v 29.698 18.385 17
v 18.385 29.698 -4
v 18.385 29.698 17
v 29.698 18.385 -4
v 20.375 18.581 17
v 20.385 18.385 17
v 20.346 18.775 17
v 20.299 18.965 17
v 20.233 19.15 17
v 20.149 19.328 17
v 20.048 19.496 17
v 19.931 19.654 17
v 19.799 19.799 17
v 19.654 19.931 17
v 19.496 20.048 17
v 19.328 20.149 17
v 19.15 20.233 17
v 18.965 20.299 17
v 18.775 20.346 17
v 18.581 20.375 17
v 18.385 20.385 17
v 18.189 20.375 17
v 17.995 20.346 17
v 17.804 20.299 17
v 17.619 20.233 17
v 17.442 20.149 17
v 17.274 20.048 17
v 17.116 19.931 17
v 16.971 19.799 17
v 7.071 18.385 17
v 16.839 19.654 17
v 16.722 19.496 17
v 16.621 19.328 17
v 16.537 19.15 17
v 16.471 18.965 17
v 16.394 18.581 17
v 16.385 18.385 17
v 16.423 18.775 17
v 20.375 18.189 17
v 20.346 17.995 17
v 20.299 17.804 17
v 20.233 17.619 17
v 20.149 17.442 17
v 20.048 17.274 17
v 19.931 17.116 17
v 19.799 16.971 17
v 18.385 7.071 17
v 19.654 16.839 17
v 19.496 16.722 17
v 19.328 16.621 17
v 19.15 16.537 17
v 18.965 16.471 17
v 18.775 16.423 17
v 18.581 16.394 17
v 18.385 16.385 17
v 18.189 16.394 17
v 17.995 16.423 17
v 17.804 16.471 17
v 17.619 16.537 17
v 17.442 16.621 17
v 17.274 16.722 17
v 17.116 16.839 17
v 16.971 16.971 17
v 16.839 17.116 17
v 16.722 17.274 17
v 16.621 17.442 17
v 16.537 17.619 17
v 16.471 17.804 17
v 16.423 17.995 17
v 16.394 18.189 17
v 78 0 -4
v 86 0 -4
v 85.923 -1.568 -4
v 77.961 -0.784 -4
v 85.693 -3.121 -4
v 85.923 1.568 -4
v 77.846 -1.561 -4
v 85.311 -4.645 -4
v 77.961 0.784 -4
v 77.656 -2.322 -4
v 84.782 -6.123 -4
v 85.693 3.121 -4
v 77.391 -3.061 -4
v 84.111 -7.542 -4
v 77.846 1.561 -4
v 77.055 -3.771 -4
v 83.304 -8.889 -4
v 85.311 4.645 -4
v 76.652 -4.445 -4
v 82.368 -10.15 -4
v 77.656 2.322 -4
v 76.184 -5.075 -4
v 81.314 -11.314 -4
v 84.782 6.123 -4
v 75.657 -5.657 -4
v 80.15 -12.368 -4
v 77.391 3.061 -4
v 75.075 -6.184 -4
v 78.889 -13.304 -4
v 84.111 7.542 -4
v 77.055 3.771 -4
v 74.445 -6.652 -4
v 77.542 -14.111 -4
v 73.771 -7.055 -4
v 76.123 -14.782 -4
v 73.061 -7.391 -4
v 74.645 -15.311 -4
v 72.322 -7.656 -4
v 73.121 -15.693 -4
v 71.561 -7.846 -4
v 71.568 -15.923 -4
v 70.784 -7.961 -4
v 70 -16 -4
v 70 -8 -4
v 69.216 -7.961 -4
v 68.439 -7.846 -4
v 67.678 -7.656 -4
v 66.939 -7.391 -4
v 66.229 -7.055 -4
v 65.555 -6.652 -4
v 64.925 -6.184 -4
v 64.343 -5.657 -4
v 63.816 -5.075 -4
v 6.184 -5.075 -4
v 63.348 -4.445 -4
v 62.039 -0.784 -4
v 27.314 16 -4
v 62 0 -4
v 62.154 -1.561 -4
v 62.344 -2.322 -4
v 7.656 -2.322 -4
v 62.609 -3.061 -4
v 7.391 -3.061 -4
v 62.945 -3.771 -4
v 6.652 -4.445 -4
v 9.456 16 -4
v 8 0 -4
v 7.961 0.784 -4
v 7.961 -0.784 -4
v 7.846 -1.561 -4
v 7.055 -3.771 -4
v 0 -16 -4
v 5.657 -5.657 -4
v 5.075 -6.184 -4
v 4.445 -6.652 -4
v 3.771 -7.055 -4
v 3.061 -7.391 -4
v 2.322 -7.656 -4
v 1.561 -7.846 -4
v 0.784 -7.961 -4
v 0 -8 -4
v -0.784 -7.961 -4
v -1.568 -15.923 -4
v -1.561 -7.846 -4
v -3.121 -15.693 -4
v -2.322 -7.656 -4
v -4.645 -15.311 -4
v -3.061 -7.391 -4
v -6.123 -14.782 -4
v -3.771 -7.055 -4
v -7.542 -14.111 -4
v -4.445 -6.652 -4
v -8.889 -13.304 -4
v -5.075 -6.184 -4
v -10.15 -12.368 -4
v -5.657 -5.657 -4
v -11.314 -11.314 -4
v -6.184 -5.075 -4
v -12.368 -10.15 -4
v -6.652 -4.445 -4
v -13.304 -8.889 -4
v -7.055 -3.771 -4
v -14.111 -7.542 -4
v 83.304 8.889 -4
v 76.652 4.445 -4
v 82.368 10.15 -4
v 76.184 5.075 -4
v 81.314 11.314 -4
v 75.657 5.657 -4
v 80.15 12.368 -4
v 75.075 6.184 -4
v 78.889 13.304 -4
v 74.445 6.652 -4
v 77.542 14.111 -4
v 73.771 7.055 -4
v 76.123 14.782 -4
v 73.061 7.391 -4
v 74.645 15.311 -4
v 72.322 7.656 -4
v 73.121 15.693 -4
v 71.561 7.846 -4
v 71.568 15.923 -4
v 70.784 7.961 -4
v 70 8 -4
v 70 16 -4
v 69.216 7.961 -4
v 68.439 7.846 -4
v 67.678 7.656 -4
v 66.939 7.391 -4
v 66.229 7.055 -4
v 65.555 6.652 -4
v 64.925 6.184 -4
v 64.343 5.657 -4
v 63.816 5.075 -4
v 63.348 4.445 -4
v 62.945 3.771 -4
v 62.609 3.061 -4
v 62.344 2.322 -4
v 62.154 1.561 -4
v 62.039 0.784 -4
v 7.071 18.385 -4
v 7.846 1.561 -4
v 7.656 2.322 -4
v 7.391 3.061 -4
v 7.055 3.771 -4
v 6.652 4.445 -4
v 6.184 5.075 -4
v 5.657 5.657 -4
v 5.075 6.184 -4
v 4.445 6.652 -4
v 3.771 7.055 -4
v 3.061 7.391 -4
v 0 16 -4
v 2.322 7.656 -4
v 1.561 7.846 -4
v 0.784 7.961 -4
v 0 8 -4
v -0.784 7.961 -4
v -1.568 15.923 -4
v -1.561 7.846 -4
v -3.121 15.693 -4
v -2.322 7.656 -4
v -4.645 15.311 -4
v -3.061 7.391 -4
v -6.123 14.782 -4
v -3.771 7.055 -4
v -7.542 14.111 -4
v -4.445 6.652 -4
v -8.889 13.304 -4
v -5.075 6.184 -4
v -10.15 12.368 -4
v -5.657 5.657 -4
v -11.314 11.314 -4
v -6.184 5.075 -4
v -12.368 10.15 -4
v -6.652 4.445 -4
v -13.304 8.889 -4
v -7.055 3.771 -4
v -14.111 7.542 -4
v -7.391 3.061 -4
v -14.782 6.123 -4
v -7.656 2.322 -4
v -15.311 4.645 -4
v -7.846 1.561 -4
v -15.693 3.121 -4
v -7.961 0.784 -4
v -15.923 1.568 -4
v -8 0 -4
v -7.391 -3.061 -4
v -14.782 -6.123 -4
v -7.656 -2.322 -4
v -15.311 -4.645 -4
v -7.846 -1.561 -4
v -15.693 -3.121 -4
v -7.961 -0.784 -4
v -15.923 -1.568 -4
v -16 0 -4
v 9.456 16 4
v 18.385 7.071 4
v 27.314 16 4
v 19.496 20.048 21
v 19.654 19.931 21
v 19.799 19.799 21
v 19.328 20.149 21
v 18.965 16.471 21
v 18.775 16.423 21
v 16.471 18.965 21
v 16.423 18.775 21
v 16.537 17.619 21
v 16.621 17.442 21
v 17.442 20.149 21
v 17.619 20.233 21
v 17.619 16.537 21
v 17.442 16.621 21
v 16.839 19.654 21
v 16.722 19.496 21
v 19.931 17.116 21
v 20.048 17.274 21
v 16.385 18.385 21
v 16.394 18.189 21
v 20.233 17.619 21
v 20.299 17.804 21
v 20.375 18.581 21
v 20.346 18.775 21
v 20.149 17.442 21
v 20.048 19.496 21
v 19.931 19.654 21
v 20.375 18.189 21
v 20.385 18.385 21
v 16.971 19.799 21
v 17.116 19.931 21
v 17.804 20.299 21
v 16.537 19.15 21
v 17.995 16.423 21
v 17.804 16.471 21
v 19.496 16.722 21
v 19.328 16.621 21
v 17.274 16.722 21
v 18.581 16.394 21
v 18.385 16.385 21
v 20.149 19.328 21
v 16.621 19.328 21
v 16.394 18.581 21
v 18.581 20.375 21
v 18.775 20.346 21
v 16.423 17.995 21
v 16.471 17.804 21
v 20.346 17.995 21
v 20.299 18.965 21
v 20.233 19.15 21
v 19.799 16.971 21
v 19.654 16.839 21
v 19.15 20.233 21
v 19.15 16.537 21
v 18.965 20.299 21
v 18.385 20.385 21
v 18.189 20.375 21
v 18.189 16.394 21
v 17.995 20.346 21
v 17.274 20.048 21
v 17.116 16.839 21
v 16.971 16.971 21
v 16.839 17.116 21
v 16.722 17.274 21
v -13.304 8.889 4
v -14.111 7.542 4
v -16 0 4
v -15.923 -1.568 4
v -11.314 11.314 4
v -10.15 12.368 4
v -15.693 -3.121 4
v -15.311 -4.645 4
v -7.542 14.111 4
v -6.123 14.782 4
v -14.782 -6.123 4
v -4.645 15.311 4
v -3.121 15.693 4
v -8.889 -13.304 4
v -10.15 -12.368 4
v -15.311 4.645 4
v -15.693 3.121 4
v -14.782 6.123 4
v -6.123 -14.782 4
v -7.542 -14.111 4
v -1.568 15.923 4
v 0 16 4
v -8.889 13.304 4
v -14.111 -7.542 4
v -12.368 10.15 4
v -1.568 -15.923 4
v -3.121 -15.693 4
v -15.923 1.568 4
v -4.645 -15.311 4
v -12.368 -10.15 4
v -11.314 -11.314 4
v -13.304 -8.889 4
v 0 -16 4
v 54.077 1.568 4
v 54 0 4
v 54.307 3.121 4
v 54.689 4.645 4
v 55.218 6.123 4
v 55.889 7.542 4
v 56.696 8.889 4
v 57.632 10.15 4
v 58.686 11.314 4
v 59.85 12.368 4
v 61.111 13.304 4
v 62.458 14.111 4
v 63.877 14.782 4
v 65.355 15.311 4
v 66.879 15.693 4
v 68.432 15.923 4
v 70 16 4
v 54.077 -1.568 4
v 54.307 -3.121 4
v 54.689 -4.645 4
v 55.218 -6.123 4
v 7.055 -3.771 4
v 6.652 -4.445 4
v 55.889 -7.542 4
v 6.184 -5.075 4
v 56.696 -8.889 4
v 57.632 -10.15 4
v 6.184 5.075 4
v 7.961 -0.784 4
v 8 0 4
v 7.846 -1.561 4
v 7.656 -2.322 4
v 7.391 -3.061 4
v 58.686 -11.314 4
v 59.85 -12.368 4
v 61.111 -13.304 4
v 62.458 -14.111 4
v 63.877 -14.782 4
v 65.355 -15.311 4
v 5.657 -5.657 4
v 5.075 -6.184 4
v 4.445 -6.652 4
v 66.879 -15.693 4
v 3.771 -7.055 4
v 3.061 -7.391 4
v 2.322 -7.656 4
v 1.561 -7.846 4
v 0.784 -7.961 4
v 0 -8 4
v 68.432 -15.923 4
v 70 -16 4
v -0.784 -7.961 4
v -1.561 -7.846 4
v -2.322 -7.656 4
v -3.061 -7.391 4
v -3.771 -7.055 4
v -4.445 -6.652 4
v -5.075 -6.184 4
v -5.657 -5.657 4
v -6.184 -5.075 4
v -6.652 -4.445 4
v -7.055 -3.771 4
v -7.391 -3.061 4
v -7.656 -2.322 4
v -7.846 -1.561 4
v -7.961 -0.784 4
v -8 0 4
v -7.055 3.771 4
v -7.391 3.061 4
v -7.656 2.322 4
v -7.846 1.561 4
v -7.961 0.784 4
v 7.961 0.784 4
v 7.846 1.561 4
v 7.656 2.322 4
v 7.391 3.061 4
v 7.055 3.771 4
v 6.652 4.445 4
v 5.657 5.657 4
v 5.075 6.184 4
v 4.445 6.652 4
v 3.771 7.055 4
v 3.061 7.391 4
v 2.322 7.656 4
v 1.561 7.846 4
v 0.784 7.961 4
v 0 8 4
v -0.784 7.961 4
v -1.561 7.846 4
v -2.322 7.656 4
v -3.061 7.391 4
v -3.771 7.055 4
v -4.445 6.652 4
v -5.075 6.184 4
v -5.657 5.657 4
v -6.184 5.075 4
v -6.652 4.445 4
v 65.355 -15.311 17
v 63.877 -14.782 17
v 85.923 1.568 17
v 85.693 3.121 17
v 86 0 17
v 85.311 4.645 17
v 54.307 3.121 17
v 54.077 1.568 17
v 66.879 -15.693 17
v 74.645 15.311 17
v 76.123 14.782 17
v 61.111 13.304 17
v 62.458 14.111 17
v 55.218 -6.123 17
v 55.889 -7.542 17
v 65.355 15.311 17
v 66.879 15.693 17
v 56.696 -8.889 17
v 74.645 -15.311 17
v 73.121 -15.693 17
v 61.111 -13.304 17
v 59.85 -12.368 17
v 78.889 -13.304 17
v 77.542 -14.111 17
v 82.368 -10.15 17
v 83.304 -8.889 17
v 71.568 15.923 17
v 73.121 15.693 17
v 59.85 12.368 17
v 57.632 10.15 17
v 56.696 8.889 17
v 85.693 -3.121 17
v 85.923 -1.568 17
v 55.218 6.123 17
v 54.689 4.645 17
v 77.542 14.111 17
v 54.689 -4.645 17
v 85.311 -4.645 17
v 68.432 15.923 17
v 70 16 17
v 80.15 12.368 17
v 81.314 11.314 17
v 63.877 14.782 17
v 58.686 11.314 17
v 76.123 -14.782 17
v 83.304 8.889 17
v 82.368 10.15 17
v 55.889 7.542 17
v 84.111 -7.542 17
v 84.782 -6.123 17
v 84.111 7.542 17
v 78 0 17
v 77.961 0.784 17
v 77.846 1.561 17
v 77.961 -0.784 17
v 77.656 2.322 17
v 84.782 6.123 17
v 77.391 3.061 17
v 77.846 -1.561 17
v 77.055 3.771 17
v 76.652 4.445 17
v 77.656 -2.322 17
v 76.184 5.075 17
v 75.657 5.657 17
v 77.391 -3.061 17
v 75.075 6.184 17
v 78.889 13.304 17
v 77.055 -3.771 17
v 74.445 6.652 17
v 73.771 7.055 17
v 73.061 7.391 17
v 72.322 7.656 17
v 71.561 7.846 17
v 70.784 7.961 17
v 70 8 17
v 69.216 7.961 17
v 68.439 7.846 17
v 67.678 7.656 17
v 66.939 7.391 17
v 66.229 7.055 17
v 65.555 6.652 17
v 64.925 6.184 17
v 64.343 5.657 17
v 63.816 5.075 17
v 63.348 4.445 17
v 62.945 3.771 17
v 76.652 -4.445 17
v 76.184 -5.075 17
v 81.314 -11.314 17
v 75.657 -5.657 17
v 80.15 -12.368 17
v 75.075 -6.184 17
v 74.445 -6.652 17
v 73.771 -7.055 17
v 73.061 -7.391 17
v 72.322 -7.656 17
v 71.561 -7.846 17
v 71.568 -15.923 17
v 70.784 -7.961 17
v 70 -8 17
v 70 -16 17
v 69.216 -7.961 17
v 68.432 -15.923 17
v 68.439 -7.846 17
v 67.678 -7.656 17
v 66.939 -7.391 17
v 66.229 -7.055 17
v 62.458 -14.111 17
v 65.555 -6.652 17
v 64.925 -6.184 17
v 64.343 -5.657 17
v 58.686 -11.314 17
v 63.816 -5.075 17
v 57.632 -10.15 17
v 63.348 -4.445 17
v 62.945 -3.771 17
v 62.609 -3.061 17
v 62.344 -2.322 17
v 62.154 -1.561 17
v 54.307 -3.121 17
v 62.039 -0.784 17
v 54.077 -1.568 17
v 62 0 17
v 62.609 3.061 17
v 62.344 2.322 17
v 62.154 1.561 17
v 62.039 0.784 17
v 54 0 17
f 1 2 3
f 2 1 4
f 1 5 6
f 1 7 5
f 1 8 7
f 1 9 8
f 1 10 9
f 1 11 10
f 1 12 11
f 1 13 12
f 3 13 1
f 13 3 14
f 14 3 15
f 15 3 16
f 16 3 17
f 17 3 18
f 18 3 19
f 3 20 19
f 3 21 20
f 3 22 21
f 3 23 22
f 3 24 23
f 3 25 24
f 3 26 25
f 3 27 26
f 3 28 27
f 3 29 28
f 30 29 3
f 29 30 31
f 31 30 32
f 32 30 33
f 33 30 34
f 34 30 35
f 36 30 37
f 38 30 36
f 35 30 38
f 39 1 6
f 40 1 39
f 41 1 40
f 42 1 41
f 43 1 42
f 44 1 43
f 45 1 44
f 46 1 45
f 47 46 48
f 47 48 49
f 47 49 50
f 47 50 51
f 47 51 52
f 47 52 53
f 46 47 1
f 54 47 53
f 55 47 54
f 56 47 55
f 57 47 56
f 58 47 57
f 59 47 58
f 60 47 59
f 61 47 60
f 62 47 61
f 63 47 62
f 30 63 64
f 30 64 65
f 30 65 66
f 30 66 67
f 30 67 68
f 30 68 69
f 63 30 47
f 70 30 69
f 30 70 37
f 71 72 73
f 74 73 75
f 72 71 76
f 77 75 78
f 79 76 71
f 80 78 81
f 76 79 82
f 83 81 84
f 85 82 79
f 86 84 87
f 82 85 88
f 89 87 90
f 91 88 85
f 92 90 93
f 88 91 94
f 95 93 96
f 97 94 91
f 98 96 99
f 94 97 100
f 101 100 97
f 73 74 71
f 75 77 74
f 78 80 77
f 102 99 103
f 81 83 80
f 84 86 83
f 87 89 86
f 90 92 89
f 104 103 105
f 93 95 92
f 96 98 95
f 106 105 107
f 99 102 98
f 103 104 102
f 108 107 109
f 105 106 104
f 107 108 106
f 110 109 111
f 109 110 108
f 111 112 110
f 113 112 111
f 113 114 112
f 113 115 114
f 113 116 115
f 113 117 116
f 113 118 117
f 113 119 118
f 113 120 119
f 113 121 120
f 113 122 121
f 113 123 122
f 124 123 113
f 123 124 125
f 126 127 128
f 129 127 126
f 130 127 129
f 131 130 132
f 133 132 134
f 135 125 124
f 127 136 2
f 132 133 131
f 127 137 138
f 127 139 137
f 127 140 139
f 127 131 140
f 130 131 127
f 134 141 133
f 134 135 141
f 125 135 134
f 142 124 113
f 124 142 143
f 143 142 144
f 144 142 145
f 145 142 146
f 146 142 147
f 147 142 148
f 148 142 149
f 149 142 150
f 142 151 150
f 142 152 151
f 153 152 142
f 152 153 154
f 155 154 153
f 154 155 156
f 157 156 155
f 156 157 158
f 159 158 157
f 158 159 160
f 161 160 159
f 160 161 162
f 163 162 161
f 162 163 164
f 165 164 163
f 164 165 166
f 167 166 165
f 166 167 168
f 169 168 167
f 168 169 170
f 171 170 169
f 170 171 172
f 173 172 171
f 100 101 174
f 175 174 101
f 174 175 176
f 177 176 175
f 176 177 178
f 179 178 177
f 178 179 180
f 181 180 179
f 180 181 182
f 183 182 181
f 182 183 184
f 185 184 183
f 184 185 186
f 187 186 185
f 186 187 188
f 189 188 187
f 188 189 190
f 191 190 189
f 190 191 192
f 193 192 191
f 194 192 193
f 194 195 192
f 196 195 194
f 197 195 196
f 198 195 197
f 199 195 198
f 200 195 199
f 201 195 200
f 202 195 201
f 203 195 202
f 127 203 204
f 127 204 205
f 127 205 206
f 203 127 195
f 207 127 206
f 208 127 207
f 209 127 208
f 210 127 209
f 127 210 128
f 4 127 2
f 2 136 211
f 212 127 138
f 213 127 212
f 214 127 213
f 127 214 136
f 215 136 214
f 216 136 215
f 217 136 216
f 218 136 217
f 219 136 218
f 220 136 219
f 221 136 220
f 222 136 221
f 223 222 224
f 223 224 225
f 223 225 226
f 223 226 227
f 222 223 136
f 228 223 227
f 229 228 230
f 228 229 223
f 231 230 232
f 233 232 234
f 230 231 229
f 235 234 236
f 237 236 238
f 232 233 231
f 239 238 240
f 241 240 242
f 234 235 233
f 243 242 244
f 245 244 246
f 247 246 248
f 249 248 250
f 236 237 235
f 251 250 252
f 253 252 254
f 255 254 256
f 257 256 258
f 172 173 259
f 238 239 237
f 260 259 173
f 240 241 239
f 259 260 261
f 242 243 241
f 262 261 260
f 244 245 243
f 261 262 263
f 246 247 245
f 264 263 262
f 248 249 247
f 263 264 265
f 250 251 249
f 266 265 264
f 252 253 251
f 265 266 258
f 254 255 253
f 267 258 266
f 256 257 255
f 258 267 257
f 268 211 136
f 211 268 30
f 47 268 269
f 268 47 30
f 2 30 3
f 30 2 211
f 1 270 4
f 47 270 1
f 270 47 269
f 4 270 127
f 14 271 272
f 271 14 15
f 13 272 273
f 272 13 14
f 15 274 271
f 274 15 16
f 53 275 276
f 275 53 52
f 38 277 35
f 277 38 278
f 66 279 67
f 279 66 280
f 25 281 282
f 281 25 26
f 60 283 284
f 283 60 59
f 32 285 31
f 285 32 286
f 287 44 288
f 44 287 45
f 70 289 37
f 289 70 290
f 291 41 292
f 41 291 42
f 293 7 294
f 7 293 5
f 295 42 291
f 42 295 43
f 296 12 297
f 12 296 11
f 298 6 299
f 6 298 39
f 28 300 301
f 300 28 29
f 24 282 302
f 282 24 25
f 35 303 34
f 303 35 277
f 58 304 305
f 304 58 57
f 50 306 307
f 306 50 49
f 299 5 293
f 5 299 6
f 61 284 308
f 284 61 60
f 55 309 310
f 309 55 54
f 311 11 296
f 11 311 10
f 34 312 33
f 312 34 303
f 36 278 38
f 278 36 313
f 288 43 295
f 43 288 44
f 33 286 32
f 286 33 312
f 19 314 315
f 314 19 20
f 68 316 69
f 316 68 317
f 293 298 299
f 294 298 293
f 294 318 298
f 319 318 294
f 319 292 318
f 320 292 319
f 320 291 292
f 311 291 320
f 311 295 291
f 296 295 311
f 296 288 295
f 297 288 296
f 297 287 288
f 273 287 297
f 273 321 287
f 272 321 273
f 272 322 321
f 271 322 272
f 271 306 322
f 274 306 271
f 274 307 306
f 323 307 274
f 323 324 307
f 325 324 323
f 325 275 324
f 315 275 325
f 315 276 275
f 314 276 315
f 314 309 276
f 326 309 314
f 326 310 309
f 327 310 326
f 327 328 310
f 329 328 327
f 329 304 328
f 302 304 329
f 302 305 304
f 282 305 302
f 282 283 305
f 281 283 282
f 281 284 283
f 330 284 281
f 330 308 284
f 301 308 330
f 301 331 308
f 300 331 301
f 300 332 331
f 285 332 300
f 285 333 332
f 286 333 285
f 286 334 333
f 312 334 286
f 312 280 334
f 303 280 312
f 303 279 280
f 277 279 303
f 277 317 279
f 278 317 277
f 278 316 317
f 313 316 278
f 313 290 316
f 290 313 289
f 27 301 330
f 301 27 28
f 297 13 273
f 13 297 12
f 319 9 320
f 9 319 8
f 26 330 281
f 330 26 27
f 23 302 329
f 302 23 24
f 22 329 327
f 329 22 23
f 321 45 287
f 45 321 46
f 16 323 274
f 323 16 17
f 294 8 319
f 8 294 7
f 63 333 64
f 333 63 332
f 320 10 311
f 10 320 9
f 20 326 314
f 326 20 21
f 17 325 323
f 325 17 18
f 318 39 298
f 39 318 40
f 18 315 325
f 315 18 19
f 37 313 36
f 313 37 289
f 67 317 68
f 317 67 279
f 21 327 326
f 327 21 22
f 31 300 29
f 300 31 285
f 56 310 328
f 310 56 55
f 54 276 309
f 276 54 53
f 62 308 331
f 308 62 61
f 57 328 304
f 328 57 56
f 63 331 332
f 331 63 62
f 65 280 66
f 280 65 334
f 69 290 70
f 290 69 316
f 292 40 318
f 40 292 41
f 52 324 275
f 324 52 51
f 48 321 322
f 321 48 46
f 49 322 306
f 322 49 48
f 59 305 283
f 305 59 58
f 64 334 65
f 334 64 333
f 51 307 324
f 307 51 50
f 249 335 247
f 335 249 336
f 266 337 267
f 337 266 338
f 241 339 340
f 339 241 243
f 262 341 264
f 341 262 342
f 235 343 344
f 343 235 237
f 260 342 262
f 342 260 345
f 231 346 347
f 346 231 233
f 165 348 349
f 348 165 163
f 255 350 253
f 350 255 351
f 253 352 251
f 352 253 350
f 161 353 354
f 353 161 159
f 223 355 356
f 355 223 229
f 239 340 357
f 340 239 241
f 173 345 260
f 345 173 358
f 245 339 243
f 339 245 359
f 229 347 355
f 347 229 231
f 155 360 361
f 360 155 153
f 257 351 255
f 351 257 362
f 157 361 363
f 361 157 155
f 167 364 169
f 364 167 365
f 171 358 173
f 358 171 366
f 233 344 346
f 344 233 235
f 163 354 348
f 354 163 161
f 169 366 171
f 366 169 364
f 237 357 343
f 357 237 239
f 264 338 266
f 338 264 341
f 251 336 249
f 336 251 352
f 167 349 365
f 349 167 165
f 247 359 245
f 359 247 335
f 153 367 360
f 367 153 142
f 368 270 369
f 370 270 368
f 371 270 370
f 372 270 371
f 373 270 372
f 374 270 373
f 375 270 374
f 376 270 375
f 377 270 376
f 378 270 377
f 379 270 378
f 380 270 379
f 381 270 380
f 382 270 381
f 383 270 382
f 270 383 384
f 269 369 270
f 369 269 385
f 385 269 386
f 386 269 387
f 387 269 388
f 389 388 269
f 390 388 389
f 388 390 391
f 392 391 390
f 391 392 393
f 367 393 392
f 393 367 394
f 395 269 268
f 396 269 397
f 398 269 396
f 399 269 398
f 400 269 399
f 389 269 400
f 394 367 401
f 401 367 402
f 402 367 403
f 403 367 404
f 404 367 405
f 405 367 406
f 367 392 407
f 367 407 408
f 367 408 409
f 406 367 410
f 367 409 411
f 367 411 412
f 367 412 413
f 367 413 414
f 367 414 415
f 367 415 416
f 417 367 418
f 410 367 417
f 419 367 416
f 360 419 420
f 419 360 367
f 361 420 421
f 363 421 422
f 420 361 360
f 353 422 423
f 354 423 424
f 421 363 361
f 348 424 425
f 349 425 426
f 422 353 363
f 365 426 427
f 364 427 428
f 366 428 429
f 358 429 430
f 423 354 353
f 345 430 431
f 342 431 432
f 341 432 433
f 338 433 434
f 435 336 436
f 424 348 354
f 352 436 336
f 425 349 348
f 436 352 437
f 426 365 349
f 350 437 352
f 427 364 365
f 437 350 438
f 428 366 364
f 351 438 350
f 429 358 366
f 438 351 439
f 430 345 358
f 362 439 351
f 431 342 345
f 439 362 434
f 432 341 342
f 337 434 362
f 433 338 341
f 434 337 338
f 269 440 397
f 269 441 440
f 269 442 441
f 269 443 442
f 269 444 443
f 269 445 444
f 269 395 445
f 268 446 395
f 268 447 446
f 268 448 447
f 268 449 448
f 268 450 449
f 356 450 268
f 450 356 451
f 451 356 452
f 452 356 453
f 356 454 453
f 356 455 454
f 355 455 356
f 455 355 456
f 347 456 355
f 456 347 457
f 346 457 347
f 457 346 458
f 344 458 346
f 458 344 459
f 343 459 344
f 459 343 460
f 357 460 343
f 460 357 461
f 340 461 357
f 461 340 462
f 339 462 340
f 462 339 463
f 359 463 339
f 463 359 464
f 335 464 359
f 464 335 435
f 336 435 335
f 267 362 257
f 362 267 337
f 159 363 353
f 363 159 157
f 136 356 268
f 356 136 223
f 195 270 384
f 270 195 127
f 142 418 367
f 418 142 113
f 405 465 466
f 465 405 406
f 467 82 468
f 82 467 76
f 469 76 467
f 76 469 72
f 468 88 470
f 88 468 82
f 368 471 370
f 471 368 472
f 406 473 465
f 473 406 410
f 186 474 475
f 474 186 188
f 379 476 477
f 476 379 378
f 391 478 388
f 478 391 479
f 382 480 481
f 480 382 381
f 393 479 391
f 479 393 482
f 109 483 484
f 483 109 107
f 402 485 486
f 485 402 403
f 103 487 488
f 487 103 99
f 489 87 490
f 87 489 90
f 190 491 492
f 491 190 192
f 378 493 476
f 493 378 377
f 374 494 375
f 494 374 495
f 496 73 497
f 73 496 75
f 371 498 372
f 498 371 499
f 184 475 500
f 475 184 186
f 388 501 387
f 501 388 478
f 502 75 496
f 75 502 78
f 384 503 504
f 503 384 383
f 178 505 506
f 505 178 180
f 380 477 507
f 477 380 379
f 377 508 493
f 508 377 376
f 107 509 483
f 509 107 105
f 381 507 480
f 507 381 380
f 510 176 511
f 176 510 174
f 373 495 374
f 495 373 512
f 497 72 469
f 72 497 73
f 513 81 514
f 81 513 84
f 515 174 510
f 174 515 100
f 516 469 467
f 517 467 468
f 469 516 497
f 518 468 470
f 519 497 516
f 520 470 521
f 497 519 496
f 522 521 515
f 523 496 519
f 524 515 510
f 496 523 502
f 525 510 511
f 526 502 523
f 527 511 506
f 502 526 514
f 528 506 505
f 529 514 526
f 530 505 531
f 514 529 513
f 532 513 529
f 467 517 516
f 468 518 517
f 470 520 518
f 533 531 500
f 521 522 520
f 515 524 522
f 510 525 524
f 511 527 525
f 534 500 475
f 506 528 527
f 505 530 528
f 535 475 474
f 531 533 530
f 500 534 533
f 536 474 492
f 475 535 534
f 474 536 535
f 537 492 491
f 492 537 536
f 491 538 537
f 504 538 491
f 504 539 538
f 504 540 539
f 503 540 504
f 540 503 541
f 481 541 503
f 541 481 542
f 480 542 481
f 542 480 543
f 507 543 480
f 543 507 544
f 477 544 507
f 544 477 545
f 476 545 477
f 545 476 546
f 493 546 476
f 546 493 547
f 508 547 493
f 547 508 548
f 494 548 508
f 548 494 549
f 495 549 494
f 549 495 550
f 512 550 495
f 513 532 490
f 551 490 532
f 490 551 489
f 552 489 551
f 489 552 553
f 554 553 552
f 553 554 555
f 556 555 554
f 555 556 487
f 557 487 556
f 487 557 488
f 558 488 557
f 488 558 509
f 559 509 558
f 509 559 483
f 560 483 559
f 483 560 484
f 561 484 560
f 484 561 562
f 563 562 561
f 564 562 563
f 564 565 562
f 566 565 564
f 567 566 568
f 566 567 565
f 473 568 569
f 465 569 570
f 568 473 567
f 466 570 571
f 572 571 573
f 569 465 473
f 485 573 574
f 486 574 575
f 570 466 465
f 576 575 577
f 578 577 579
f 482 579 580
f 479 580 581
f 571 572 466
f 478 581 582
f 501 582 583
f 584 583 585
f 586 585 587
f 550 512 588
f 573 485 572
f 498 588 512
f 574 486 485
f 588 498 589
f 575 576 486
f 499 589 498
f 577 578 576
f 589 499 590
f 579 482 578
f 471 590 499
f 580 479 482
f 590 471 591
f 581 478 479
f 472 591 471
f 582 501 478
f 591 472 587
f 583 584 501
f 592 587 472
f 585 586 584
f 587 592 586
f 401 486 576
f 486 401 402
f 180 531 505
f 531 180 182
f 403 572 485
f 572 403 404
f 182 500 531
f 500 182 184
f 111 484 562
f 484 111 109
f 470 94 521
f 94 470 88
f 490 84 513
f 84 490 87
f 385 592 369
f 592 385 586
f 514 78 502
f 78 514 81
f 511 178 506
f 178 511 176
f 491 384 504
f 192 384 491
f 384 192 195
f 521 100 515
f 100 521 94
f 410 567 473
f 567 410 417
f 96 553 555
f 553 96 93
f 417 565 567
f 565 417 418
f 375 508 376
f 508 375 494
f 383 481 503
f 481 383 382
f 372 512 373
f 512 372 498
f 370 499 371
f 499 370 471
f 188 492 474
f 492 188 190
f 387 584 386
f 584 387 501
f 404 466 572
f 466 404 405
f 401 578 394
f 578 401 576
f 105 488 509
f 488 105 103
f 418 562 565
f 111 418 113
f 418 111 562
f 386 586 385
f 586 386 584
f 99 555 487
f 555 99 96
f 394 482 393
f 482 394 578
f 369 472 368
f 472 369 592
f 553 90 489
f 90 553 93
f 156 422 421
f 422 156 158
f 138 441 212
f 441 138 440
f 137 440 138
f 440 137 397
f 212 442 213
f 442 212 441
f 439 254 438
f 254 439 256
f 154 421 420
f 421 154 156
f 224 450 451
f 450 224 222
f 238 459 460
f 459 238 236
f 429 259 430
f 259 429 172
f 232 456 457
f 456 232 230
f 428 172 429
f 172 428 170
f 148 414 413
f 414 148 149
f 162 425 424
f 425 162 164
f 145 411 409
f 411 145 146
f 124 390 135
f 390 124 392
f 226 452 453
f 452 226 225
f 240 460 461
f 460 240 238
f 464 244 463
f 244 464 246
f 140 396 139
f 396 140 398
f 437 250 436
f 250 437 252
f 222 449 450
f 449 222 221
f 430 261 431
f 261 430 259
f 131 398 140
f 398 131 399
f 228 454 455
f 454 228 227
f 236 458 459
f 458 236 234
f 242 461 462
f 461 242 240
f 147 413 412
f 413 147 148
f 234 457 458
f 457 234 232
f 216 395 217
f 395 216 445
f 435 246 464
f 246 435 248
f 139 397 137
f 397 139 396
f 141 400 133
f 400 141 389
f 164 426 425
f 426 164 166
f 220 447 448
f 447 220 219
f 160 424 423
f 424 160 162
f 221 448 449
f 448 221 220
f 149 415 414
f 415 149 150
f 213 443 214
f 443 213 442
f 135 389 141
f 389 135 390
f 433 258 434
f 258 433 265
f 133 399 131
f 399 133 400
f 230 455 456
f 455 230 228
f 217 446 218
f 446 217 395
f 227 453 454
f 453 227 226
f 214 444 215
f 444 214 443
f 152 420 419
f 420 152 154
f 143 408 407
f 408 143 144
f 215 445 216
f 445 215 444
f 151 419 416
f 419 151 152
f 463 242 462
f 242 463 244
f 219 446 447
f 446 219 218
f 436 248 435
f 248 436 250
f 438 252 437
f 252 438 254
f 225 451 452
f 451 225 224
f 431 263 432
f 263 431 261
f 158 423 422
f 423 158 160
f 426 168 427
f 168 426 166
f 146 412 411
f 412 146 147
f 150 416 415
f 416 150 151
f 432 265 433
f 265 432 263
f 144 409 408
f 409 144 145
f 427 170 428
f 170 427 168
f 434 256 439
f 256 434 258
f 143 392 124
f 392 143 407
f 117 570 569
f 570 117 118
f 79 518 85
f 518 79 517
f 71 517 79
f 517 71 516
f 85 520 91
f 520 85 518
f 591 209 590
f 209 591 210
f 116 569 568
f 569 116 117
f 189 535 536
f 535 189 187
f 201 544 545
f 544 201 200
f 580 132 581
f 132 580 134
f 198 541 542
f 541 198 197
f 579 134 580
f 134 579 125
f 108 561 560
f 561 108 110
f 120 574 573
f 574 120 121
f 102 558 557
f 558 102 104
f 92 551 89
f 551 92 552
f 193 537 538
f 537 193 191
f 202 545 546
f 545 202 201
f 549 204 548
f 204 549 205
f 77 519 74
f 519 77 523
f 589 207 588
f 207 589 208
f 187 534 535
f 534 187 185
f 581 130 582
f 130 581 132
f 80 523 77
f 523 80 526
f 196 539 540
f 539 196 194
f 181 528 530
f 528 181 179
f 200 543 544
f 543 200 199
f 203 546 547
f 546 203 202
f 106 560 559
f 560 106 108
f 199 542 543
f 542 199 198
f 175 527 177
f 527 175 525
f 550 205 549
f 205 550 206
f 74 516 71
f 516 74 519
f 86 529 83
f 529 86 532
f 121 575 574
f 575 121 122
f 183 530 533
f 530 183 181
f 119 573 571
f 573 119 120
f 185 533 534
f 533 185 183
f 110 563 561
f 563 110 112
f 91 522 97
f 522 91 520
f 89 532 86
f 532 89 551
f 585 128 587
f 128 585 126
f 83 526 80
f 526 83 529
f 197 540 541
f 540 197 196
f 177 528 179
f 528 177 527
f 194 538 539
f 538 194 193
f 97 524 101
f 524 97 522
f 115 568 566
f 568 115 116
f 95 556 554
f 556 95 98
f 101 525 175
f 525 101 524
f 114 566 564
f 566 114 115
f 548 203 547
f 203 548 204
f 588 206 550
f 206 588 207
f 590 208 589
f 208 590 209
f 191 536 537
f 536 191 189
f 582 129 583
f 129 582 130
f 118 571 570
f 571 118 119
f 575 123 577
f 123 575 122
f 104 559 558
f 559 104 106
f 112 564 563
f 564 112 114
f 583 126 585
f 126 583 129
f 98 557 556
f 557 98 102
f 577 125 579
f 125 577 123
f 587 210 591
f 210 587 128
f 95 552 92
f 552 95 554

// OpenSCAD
move_rod =  70;
thick = 8; // left side   should  be thicker. 
// thick = 2.5;
rod_diameter  = 16;

outer_rod_diameter = 26;

plate_width = rod_diameter * 2;

old_thick = 42 / 2; // this thick is the original holder. 



difference() {
  translate([- rod_diameter * 1.5, - rod_diameter * 1.5, 0]){
    translate([rod_diameter * 1.5, rod_diameter * 1.5, 0]) {
      cylinder(h=thick, d = plate_width, center=true, $fn=64);
      
      rotate(a = [0, 0, 45]) {
        translate([outer_rod_diameter, 0, old_thick / 2 - thick / 2]) {
          cube(size = [rod_diameter, rod_diameter, old_thick], center = true);
          translate([0, 0, thick / 2]) {
            cylinder(h = old_thick, d = rod_diameter / 4, center = true, $fn=64);
          }
        }
      }
    }
    translate([move_rod / 2 + rod_diameter * 1.5, rod_diameter * 1.5, 0]) {
      cube(size = [move_rod, plate_width, thick], center = true);
    }
    translate([rod_diameter * 1.5 + move_rod, rod_diameter * 1.5, old_thick / 2 - thick / 2]) {
      cylinder(h=old_thick, d = plate_width, center=true, $fn=64);
    }
  }
  translate([- rod_diameter * 1.5, - rod_diameter * 1.5, 0]){
    translate([rod_diameter * 1.5, rod_diameter * 1.5, old_thick / 2]) {
      # cylinder(h=old_thick * 2, d = rod_diameter, center=true, $fn=64);
    }
    translate([rod_diameter * 1.5 + move_rod, rod_diameter * 1.5, old_thick / 2]) {
      #cylinder(h=old_thick * 2, d = rod_diameter, center=true, $fn=64);
    }
  }
}
